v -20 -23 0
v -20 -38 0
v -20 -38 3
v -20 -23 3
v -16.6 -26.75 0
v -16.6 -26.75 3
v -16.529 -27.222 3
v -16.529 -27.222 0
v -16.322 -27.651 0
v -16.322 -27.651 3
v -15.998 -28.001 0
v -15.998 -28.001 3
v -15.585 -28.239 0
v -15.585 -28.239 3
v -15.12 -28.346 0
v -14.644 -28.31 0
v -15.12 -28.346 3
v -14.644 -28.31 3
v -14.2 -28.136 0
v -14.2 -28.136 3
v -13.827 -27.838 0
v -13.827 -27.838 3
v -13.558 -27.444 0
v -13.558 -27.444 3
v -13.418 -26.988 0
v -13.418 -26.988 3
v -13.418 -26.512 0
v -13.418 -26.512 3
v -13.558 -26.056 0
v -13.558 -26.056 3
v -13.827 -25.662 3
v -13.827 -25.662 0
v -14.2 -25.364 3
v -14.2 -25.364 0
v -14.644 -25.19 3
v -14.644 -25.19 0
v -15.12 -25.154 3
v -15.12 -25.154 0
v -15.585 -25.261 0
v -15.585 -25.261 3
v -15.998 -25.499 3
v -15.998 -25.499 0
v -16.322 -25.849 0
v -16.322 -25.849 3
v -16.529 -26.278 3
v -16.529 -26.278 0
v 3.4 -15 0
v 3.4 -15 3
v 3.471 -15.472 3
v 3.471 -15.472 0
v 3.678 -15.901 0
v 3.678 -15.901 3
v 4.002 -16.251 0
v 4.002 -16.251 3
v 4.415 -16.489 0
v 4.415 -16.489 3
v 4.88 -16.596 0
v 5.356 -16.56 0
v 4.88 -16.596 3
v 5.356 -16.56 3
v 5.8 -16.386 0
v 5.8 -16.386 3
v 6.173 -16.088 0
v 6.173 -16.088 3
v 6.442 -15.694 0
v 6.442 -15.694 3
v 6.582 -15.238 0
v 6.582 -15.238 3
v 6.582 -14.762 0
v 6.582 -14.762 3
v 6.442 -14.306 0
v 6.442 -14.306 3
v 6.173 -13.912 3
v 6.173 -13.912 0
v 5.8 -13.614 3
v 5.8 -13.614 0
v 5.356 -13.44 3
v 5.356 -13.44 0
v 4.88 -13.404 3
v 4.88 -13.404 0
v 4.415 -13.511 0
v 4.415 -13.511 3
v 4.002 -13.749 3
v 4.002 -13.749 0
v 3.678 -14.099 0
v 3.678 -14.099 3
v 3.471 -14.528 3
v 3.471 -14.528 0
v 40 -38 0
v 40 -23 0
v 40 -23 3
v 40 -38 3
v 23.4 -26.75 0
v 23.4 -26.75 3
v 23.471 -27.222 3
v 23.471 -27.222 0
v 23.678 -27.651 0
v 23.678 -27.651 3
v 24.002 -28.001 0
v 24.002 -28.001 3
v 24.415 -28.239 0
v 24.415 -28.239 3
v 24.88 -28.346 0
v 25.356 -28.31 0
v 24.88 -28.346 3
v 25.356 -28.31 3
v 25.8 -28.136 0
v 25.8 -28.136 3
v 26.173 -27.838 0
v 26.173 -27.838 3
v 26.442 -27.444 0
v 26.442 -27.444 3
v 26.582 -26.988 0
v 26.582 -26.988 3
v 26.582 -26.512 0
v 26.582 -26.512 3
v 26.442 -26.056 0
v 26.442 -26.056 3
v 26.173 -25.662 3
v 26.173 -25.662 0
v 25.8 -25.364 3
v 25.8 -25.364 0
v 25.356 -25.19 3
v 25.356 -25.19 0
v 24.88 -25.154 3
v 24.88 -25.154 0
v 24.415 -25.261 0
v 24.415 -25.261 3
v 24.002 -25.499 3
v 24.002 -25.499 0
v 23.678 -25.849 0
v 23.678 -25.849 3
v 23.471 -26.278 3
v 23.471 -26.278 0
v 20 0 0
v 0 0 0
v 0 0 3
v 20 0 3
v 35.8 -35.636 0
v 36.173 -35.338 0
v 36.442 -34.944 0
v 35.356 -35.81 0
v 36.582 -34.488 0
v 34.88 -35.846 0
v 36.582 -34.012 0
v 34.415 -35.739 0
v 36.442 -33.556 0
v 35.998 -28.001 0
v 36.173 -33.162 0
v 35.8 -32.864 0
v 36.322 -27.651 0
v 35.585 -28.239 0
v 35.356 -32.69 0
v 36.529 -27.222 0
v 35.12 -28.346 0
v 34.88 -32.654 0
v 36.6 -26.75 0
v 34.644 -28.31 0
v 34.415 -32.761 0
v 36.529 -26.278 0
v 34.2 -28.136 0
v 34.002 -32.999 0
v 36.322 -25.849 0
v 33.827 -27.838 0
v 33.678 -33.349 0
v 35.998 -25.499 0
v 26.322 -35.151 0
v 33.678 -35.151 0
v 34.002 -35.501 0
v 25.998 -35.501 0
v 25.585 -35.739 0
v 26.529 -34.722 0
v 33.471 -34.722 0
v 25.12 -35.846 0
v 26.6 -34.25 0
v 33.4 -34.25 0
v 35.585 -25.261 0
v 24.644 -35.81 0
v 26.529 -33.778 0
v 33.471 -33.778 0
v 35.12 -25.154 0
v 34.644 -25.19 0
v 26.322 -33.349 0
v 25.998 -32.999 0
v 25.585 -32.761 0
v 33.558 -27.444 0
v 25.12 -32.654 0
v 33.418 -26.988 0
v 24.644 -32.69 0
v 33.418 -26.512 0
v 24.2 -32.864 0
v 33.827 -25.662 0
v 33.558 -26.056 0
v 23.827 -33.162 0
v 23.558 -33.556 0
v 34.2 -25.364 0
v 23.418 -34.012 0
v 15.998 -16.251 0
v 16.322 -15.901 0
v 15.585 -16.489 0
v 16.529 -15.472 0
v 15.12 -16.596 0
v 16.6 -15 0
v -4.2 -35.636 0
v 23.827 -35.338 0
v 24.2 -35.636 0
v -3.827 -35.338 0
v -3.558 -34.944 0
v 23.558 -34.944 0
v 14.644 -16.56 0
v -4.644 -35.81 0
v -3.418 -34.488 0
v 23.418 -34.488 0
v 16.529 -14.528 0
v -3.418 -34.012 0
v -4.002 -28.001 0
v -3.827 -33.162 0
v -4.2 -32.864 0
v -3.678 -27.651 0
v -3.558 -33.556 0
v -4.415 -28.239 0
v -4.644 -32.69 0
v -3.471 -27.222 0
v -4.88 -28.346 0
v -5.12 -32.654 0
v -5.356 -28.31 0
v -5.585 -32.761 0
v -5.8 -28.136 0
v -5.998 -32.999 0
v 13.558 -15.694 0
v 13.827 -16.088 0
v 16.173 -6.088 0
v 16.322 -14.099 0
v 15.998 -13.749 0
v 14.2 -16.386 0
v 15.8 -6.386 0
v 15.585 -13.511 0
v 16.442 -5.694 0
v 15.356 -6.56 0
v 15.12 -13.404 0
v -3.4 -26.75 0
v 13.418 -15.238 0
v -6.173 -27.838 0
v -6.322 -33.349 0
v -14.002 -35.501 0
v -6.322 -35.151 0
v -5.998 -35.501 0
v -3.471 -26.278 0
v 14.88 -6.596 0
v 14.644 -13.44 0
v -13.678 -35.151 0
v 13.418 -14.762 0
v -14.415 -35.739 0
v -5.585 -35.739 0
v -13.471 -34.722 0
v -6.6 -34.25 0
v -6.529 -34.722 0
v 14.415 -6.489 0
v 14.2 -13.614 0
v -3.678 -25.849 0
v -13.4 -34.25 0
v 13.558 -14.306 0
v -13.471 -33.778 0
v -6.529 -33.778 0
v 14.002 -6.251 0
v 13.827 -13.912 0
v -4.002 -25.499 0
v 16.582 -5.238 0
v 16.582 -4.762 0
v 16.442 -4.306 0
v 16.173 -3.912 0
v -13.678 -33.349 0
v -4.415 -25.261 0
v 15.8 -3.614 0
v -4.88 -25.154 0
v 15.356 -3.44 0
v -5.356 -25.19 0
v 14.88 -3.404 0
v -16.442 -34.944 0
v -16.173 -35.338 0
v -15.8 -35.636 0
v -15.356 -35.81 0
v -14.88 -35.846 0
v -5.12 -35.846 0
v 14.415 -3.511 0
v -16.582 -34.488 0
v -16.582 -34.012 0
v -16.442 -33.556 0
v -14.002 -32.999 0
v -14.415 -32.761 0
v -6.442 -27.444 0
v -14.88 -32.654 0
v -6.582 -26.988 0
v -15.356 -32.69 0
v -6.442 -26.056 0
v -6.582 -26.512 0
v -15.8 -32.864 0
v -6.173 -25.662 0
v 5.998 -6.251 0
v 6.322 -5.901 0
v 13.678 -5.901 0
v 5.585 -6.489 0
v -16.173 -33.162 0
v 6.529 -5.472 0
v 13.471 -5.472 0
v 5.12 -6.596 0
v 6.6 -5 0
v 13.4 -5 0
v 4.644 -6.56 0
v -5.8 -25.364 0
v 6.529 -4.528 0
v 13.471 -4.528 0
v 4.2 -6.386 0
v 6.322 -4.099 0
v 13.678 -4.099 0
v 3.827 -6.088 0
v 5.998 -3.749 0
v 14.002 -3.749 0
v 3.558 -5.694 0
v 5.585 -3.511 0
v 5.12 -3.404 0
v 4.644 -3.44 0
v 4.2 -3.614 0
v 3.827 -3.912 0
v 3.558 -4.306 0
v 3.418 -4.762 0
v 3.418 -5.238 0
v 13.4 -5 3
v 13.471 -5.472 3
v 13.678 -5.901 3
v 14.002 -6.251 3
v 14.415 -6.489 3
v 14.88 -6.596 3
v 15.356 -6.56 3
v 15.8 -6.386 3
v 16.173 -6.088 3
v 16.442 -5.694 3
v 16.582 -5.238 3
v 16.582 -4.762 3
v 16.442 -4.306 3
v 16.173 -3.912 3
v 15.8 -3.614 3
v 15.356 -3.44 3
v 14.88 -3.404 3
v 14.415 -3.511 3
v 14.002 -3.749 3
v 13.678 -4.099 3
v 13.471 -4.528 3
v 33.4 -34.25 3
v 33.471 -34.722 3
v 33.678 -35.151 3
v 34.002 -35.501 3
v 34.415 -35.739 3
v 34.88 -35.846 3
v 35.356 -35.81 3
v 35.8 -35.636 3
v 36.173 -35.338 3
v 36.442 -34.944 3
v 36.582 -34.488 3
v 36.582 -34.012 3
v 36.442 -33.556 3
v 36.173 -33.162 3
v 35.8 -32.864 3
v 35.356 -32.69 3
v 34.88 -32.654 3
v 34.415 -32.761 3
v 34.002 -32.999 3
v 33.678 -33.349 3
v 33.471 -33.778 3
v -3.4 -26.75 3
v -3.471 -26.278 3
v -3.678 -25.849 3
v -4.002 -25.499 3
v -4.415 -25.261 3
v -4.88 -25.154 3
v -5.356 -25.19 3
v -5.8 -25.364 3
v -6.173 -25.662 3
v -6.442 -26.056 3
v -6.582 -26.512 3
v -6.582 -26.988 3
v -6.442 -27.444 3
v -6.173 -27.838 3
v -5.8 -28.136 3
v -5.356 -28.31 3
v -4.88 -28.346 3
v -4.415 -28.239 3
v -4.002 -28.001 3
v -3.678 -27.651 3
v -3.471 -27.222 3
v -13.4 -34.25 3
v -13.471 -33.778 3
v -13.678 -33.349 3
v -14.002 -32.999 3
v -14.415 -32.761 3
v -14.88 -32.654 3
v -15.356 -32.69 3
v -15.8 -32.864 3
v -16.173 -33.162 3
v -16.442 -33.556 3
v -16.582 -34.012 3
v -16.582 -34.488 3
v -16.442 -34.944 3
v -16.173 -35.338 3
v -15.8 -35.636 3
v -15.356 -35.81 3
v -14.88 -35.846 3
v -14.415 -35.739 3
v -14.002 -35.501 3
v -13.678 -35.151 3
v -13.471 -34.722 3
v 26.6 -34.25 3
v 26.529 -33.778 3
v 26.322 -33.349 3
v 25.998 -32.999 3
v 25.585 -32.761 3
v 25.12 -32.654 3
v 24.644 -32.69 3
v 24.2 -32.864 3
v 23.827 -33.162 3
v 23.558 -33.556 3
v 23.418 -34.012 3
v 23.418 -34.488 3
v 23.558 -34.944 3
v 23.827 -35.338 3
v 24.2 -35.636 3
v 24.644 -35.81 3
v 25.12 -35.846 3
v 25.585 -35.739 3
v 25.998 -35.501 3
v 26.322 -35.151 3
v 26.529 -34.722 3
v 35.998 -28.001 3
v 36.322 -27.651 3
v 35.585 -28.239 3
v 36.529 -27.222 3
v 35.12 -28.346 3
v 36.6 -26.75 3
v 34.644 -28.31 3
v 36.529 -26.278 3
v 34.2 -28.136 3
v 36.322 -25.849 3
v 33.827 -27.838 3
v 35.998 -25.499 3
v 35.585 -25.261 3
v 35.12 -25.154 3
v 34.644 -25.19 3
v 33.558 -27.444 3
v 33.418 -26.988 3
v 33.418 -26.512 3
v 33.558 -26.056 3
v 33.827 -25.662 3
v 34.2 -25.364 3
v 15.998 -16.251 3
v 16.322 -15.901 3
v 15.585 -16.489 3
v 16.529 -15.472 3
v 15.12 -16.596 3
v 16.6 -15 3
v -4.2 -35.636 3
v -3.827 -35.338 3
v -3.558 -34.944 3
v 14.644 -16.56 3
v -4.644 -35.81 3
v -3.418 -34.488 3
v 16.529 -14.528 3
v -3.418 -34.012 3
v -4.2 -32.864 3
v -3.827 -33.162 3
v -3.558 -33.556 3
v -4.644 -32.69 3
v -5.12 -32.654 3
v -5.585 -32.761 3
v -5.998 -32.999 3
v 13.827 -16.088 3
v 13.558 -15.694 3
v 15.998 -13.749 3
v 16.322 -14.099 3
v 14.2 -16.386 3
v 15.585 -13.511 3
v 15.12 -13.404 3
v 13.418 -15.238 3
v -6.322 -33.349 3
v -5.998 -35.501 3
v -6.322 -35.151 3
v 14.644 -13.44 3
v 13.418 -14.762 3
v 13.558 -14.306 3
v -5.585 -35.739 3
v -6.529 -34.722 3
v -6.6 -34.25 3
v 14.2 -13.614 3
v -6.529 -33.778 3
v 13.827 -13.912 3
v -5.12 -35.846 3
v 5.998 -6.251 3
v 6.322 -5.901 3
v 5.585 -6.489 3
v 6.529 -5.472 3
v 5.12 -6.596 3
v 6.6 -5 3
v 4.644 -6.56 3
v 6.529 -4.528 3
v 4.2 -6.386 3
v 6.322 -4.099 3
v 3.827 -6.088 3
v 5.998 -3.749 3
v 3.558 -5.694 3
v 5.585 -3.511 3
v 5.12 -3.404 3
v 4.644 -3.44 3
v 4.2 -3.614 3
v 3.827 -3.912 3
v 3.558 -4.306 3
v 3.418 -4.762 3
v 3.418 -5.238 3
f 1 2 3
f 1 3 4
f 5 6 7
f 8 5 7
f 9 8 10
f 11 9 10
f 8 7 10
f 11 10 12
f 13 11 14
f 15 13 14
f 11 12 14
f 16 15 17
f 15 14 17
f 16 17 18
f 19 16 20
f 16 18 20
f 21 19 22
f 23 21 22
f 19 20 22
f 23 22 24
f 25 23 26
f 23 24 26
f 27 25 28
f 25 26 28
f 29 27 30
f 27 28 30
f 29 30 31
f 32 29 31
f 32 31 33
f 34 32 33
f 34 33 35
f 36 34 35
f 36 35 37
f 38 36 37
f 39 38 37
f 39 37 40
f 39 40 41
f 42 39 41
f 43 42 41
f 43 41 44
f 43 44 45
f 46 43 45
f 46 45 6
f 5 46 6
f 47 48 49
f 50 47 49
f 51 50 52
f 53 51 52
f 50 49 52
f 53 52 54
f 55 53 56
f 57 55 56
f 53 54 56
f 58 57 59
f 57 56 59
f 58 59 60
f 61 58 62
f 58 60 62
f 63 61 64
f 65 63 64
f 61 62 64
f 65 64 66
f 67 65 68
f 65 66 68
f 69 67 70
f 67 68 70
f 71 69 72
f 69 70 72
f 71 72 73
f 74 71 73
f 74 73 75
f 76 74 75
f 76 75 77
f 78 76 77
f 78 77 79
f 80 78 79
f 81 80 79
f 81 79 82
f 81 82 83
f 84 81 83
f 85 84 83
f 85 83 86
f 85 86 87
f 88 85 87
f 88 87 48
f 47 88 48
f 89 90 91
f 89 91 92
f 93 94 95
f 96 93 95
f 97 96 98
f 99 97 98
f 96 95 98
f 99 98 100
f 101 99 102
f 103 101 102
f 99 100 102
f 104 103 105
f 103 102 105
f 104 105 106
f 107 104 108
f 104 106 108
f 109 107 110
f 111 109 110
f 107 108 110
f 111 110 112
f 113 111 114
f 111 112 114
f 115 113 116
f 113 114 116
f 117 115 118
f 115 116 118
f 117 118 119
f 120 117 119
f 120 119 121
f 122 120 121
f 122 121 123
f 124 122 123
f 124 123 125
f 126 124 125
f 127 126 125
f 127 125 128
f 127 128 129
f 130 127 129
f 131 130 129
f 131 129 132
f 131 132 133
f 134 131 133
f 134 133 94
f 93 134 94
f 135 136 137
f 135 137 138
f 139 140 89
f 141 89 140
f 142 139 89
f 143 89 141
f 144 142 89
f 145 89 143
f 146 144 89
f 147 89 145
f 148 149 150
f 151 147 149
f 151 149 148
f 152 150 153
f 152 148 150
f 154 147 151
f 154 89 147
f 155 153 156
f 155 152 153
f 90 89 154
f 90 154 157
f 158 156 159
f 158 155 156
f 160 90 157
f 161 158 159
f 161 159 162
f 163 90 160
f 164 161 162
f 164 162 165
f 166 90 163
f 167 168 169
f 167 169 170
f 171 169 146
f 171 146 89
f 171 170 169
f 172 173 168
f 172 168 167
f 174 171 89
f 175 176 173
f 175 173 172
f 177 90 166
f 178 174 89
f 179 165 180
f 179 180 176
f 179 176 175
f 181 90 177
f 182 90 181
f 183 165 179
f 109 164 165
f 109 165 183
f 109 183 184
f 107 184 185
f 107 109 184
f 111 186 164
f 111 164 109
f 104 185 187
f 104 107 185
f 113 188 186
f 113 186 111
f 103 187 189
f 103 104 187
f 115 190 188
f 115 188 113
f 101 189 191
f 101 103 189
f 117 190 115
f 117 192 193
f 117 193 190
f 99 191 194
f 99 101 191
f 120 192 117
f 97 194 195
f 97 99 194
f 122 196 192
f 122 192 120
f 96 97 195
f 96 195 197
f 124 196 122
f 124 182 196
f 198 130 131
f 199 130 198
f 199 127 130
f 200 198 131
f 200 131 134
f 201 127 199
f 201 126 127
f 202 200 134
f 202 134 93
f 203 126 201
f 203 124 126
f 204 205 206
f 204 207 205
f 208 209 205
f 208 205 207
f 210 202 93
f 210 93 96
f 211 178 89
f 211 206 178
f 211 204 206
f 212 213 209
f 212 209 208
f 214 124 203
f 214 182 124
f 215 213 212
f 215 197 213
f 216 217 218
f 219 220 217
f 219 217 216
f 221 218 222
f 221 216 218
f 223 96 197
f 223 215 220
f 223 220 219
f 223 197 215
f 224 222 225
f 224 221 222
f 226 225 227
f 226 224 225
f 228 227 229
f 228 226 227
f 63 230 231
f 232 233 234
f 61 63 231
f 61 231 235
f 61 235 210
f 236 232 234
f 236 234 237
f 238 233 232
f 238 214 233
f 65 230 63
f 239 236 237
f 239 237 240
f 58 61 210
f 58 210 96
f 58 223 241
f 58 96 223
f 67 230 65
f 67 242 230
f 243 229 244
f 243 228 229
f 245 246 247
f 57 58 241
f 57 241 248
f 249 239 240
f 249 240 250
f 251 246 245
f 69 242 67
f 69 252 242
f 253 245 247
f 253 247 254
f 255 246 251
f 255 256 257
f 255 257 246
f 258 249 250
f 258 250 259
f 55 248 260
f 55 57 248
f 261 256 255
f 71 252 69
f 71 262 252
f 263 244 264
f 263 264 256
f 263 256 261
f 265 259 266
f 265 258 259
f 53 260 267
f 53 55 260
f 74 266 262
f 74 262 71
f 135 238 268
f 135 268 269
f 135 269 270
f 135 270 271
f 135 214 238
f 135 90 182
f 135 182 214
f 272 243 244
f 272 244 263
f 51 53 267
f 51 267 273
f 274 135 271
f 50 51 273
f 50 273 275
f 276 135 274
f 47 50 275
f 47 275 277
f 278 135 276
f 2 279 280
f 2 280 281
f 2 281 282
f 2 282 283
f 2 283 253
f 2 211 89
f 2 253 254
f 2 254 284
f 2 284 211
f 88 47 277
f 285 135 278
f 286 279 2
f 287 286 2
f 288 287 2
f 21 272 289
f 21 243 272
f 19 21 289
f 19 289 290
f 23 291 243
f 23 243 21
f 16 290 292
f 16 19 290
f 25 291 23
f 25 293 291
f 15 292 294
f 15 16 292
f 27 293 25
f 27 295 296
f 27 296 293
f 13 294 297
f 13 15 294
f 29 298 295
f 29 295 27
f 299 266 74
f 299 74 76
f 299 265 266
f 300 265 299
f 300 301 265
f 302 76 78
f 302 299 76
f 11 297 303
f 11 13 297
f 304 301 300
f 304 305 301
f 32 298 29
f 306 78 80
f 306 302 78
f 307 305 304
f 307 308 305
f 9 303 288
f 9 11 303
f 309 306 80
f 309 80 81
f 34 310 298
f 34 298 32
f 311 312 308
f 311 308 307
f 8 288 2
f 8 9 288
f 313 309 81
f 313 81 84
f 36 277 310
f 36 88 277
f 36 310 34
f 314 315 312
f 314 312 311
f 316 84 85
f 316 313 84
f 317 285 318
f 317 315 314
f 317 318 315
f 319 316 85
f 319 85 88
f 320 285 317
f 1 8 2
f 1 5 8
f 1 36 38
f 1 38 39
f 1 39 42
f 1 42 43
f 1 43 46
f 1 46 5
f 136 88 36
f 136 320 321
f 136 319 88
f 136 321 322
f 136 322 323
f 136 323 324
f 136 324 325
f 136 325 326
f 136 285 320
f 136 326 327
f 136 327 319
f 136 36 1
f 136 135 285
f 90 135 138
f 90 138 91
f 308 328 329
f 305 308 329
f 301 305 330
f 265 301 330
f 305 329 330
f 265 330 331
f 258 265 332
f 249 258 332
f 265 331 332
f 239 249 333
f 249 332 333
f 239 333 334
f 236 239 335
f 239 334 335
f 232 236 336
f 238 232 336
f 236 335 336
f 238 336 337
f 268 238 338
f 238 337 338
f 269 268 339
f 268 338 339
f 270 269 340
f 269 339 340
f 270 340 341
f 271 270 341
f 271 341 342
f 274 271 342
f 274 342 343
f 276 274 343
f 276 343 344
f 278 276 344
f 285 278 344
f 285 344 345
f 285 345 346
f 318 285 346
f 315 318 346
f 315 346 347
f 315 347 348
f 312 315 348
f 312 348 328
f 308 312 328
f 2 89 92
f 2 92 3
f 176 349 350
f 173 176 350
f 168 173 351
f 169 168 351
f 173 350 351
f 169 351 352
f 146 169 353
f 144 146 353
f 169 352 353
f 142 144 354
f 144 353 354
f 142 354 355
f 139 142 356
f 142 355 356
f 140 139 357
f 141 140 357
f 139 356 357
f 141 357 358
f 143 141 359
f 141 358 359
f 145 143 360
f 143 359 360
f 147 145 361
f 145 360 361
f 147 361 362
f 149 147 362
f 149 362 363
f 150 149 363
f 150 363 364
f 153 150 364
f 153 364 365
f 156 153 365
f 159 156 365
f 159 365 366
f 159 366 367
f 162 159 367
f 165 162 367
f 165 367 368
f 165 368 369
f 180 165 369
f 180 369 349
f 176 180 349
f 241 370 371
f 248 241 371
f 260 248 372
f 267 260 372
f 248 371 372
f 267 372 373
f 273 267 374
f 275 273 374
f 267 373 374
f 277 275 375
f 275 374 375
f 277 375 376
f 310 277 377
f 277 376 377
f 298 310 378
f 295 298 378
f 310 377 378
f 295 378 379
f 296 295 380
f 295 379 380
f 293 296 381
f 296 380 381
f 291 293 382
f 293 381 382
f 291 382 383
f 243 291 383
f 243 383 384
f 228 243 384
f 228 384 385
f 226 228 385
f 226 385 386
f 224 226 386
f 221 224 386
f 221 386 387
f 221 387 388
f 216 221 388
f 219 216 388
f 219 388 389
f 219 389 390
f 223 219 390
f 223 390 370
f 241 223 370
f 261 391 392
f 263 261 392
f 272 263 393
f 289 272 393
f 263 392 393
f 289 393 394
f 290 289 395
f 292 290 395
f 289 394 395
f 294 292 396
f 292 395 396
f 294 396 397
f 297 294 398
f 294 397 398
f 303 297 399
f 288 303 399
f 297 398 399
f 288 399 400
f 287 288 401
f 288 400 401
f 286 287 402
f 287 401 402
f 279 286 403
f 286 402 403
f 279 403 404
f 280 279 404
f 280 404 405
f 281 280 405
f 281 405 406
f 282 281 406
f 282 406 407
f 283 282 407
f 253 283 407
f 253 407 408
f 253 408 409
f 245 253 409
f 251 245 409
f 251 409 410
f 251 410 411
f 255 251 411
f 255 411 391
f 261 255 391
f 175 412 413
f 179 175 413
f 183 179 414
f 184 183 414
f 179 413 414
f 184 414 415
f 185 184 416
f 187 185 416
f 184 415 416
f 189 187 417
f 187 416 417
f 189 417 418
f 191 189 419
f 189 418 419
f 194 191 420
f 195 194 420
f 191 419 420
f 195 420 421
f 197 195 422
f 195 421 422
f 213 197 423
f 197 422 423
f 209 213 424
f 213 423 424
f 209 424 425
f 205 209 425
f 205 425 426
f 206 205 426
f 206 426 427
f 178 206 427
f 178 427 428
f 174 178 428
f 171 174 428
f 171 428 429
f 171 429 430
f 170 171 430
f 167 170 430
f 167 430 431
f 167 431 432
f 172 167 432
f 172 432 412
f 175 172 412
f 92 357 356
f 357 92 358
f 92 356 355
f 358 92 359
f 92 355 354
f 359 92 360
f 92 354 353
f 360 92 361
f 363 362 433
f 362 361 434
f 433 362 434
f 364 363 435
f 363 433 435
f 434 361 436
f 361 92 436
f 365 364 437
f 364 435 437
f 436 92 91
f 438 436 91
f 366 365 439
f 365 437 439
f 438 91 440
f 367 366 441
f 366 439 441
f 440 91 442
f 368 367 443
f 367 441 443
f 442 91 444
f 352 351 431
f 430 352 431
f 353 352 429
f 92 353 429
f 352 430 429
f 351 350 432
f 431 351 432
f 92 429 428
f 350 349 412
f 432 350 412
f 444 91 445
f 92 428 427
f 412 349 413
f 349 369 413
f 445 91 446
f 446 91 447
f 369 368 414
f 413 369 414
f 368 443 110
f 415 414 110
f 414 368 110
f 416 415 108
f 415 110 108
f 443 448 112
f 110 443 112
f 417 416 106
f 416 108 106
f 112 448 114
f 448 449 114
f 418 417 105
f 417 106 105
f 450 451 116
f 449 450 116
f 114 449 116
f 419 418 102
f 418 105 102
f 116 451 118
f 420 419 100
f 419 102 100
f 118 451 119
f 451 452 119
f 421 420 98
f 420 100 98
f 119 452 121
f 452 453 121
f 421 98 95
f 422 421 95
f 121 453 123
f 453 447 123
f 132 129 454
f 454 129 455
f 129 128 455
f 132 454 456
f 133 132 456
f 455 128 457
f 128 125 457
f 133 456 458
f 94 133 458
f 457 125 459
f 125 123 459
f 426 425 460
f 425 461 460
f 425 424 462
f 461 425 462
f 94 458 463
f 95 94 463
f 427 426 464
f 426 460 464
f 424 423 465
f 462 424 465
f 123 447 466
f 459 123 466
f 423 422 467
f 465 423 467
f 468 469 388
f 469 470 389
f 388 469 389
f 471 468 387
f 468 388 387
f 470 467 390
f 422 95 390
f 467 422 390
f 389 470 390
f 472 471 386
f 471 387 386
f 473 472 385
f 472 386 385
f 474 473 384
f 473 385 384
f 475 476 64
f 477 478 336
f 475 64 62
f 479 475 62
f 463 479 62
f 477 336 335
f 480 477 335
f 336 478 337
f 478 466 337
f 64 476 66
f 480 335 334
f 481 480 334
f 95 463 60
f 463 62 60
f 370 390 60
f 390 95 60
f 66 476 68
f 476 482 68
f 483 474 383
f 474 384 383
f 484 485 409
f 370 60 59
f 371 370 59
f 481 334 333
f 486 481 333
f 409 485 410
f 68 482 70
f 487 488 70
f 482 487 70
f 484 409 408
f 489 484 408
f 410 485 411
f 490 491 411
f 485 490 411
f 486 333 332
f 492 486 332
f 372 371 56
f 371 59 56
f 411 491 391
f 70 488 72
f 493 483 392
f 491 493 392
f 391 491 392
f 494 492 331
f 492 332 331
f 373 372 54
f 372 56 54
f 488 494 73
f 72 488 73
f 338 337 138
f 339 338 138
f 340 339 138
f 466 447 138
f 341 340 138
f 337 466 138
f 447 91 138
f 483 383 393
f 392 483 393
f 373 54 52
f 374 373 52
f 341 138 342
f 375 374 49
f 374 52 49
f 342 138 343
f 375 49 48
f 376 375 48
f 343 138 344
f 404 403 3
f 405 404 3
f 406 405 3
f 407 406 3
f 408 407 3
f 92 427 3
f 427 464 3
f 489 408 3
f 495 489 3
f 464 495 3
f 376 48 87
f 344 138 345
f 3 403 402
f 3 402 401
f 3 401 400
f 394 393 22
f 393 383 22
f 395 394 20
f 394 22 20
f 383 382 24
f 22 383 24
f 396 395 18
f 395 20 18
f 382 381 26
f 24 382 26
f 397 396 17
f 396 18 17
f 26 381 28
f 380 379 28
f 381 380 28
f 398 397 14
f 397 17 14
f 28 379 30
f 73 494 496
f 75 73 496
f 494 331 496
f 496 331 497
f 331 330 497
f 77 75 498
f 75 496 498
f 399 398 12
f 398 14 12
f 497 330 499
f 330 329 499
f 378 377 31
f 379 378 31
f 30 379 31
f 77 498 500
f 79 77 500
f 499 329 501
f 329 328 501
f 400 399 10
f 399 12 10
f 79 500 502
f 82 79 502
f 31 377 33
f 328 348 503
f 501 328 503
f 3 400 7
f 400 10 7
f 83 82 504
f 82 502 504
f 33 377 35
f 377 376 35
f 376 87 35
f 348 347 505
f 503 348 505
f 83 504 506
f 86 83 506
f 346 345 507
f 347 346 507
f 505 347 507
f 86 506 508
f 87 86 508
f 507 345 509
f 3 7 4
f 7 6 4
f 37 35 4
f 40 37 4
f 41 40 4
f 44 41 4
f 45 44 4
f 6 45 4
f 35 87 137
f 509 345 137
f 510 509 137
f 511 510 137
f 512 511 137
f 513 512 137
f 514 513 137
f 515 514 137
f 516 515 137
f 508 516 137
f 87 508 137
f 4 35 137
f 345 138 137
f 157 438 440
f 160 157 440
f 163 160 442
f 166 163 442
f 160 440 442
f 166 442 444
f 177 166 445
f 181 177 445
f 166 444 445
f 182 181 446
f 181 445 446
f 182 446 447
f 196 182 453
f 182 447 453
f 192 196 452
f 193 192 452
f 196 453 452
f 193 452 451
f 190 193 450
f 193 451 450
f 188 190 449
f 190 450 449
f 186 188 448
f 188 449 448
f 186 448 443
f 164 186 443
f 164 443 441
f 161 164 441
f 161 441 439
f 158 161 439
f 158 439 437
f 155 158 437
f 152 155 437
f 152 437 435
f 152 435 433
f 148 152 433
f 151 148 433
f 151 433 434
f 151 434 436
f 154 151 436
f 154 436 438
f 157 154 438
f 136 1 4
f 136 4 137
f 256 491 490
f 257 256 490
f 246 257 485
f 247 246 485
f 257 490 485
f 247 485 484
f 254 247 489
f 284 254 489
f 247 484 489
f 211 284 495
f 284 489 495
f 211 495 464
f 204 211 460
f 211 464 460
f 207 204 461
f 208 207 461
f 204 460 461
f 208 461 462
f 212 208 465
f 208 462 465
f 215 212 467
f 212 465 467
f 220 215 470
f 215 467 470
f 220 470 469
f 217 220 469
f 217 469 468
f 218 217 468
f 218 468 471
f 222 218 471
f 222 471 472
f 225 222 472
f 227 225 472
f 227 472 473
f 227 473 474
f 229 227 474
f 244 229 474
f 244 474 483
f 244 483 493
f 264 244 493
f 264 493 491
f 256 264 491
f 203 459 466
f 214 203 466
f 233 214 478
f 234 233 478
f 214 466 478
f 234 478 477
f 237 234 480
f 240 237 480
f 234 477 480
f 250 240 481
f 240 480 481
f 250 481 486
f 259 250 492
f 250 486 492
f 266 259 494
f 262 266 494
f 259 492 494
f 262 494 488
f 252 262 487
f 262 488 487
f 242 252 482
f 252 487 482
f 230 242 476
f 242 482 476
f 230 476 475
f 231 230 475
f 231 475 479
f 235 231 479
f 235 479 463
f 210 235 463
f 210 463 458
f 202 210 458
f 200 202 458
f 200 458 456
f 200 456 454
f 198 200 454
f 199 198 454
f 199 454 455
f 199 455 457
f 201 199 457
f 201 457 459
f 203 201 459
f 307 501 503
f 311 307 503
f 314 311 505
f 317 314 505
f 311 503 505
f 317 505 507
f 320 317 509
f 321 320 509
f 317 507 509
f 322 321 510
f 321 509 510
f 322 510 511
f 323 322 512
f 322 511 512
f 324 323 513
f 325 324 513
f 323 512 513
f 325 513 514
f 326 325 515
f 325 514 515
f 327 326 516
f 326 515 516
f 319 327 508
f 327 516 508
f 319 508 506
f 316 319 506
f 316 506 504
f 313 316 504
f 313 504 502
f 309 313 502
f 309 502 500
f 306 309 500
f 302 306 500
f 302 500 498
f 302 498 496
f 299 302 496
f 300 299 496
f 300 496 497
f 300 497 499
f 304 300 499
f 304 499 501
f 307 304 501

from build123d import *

# Parameters (mm, degrees)
EXTRUDE_1_DEPTH     = 3
SKETCH_2_R          = 1.6
CUT_EXTRUDE_1_DEPTH = 56.253959134


with BuildPart() as part:
    # 草图1 → 凸台-拉伸1 (new body)
    with BuildSketch(Plane.XY):
        Polygon((0, 0), (20, 0), (40, -23), (40, -38), (-20, -38), (-20, -23), align=None)
    extrude(amount=EXTRUDE_1_DEPTH)

    # 草图2 → 切除-拉伸1 (cut, through all)
    with BuildSketch(Plane.XY.offset(3)):
        with Locations((-15, -34.25)):
            Circle(SKETCH_2_R)
        with Locations(Location((-15, -26.75, 0), (0, 0, 180))):
            Circle(SKETCH_2_R)
        with Locations(Location((-5, -34.25, 0), (0, 0, 180))):
            Circle(SKETCH_2_R)
        with Locations((-5, -26.75)):
            Circle(SKETCH_2_R)
        with Locations((25, -34.25)):
            Circle(SKETCH_2_R)
        with Locations(Location((35, -34.25, 0), (0, 0, 180))):
            Circle(SKETCH_2_R)
        with Locations(Location((25, -26.75, 0), (0, 0, 180))):
            Circle(SKETCH_2_R)
        with Locations((35, -26.75)):
            Circle(SKETCH_2_R)
        with Locations((5, -5)):
            Circle(SKETCH_2_R)
        with Locations(Location((15, -5, 0), (0, 0, 180))):
            Circle(SKETCH_2_R)
        with Locations((15, -15)):
            Circle(SKETCH_2_R)
        with Locations(Location((5, -15, 0), (0, 0, 180))):
            Circle(SKETCH_2_R)
    extrude(amount=-CUT_EXTRUDE_1_DEPTH, mode=Mode.SUBTRACT)


solid = part.part
